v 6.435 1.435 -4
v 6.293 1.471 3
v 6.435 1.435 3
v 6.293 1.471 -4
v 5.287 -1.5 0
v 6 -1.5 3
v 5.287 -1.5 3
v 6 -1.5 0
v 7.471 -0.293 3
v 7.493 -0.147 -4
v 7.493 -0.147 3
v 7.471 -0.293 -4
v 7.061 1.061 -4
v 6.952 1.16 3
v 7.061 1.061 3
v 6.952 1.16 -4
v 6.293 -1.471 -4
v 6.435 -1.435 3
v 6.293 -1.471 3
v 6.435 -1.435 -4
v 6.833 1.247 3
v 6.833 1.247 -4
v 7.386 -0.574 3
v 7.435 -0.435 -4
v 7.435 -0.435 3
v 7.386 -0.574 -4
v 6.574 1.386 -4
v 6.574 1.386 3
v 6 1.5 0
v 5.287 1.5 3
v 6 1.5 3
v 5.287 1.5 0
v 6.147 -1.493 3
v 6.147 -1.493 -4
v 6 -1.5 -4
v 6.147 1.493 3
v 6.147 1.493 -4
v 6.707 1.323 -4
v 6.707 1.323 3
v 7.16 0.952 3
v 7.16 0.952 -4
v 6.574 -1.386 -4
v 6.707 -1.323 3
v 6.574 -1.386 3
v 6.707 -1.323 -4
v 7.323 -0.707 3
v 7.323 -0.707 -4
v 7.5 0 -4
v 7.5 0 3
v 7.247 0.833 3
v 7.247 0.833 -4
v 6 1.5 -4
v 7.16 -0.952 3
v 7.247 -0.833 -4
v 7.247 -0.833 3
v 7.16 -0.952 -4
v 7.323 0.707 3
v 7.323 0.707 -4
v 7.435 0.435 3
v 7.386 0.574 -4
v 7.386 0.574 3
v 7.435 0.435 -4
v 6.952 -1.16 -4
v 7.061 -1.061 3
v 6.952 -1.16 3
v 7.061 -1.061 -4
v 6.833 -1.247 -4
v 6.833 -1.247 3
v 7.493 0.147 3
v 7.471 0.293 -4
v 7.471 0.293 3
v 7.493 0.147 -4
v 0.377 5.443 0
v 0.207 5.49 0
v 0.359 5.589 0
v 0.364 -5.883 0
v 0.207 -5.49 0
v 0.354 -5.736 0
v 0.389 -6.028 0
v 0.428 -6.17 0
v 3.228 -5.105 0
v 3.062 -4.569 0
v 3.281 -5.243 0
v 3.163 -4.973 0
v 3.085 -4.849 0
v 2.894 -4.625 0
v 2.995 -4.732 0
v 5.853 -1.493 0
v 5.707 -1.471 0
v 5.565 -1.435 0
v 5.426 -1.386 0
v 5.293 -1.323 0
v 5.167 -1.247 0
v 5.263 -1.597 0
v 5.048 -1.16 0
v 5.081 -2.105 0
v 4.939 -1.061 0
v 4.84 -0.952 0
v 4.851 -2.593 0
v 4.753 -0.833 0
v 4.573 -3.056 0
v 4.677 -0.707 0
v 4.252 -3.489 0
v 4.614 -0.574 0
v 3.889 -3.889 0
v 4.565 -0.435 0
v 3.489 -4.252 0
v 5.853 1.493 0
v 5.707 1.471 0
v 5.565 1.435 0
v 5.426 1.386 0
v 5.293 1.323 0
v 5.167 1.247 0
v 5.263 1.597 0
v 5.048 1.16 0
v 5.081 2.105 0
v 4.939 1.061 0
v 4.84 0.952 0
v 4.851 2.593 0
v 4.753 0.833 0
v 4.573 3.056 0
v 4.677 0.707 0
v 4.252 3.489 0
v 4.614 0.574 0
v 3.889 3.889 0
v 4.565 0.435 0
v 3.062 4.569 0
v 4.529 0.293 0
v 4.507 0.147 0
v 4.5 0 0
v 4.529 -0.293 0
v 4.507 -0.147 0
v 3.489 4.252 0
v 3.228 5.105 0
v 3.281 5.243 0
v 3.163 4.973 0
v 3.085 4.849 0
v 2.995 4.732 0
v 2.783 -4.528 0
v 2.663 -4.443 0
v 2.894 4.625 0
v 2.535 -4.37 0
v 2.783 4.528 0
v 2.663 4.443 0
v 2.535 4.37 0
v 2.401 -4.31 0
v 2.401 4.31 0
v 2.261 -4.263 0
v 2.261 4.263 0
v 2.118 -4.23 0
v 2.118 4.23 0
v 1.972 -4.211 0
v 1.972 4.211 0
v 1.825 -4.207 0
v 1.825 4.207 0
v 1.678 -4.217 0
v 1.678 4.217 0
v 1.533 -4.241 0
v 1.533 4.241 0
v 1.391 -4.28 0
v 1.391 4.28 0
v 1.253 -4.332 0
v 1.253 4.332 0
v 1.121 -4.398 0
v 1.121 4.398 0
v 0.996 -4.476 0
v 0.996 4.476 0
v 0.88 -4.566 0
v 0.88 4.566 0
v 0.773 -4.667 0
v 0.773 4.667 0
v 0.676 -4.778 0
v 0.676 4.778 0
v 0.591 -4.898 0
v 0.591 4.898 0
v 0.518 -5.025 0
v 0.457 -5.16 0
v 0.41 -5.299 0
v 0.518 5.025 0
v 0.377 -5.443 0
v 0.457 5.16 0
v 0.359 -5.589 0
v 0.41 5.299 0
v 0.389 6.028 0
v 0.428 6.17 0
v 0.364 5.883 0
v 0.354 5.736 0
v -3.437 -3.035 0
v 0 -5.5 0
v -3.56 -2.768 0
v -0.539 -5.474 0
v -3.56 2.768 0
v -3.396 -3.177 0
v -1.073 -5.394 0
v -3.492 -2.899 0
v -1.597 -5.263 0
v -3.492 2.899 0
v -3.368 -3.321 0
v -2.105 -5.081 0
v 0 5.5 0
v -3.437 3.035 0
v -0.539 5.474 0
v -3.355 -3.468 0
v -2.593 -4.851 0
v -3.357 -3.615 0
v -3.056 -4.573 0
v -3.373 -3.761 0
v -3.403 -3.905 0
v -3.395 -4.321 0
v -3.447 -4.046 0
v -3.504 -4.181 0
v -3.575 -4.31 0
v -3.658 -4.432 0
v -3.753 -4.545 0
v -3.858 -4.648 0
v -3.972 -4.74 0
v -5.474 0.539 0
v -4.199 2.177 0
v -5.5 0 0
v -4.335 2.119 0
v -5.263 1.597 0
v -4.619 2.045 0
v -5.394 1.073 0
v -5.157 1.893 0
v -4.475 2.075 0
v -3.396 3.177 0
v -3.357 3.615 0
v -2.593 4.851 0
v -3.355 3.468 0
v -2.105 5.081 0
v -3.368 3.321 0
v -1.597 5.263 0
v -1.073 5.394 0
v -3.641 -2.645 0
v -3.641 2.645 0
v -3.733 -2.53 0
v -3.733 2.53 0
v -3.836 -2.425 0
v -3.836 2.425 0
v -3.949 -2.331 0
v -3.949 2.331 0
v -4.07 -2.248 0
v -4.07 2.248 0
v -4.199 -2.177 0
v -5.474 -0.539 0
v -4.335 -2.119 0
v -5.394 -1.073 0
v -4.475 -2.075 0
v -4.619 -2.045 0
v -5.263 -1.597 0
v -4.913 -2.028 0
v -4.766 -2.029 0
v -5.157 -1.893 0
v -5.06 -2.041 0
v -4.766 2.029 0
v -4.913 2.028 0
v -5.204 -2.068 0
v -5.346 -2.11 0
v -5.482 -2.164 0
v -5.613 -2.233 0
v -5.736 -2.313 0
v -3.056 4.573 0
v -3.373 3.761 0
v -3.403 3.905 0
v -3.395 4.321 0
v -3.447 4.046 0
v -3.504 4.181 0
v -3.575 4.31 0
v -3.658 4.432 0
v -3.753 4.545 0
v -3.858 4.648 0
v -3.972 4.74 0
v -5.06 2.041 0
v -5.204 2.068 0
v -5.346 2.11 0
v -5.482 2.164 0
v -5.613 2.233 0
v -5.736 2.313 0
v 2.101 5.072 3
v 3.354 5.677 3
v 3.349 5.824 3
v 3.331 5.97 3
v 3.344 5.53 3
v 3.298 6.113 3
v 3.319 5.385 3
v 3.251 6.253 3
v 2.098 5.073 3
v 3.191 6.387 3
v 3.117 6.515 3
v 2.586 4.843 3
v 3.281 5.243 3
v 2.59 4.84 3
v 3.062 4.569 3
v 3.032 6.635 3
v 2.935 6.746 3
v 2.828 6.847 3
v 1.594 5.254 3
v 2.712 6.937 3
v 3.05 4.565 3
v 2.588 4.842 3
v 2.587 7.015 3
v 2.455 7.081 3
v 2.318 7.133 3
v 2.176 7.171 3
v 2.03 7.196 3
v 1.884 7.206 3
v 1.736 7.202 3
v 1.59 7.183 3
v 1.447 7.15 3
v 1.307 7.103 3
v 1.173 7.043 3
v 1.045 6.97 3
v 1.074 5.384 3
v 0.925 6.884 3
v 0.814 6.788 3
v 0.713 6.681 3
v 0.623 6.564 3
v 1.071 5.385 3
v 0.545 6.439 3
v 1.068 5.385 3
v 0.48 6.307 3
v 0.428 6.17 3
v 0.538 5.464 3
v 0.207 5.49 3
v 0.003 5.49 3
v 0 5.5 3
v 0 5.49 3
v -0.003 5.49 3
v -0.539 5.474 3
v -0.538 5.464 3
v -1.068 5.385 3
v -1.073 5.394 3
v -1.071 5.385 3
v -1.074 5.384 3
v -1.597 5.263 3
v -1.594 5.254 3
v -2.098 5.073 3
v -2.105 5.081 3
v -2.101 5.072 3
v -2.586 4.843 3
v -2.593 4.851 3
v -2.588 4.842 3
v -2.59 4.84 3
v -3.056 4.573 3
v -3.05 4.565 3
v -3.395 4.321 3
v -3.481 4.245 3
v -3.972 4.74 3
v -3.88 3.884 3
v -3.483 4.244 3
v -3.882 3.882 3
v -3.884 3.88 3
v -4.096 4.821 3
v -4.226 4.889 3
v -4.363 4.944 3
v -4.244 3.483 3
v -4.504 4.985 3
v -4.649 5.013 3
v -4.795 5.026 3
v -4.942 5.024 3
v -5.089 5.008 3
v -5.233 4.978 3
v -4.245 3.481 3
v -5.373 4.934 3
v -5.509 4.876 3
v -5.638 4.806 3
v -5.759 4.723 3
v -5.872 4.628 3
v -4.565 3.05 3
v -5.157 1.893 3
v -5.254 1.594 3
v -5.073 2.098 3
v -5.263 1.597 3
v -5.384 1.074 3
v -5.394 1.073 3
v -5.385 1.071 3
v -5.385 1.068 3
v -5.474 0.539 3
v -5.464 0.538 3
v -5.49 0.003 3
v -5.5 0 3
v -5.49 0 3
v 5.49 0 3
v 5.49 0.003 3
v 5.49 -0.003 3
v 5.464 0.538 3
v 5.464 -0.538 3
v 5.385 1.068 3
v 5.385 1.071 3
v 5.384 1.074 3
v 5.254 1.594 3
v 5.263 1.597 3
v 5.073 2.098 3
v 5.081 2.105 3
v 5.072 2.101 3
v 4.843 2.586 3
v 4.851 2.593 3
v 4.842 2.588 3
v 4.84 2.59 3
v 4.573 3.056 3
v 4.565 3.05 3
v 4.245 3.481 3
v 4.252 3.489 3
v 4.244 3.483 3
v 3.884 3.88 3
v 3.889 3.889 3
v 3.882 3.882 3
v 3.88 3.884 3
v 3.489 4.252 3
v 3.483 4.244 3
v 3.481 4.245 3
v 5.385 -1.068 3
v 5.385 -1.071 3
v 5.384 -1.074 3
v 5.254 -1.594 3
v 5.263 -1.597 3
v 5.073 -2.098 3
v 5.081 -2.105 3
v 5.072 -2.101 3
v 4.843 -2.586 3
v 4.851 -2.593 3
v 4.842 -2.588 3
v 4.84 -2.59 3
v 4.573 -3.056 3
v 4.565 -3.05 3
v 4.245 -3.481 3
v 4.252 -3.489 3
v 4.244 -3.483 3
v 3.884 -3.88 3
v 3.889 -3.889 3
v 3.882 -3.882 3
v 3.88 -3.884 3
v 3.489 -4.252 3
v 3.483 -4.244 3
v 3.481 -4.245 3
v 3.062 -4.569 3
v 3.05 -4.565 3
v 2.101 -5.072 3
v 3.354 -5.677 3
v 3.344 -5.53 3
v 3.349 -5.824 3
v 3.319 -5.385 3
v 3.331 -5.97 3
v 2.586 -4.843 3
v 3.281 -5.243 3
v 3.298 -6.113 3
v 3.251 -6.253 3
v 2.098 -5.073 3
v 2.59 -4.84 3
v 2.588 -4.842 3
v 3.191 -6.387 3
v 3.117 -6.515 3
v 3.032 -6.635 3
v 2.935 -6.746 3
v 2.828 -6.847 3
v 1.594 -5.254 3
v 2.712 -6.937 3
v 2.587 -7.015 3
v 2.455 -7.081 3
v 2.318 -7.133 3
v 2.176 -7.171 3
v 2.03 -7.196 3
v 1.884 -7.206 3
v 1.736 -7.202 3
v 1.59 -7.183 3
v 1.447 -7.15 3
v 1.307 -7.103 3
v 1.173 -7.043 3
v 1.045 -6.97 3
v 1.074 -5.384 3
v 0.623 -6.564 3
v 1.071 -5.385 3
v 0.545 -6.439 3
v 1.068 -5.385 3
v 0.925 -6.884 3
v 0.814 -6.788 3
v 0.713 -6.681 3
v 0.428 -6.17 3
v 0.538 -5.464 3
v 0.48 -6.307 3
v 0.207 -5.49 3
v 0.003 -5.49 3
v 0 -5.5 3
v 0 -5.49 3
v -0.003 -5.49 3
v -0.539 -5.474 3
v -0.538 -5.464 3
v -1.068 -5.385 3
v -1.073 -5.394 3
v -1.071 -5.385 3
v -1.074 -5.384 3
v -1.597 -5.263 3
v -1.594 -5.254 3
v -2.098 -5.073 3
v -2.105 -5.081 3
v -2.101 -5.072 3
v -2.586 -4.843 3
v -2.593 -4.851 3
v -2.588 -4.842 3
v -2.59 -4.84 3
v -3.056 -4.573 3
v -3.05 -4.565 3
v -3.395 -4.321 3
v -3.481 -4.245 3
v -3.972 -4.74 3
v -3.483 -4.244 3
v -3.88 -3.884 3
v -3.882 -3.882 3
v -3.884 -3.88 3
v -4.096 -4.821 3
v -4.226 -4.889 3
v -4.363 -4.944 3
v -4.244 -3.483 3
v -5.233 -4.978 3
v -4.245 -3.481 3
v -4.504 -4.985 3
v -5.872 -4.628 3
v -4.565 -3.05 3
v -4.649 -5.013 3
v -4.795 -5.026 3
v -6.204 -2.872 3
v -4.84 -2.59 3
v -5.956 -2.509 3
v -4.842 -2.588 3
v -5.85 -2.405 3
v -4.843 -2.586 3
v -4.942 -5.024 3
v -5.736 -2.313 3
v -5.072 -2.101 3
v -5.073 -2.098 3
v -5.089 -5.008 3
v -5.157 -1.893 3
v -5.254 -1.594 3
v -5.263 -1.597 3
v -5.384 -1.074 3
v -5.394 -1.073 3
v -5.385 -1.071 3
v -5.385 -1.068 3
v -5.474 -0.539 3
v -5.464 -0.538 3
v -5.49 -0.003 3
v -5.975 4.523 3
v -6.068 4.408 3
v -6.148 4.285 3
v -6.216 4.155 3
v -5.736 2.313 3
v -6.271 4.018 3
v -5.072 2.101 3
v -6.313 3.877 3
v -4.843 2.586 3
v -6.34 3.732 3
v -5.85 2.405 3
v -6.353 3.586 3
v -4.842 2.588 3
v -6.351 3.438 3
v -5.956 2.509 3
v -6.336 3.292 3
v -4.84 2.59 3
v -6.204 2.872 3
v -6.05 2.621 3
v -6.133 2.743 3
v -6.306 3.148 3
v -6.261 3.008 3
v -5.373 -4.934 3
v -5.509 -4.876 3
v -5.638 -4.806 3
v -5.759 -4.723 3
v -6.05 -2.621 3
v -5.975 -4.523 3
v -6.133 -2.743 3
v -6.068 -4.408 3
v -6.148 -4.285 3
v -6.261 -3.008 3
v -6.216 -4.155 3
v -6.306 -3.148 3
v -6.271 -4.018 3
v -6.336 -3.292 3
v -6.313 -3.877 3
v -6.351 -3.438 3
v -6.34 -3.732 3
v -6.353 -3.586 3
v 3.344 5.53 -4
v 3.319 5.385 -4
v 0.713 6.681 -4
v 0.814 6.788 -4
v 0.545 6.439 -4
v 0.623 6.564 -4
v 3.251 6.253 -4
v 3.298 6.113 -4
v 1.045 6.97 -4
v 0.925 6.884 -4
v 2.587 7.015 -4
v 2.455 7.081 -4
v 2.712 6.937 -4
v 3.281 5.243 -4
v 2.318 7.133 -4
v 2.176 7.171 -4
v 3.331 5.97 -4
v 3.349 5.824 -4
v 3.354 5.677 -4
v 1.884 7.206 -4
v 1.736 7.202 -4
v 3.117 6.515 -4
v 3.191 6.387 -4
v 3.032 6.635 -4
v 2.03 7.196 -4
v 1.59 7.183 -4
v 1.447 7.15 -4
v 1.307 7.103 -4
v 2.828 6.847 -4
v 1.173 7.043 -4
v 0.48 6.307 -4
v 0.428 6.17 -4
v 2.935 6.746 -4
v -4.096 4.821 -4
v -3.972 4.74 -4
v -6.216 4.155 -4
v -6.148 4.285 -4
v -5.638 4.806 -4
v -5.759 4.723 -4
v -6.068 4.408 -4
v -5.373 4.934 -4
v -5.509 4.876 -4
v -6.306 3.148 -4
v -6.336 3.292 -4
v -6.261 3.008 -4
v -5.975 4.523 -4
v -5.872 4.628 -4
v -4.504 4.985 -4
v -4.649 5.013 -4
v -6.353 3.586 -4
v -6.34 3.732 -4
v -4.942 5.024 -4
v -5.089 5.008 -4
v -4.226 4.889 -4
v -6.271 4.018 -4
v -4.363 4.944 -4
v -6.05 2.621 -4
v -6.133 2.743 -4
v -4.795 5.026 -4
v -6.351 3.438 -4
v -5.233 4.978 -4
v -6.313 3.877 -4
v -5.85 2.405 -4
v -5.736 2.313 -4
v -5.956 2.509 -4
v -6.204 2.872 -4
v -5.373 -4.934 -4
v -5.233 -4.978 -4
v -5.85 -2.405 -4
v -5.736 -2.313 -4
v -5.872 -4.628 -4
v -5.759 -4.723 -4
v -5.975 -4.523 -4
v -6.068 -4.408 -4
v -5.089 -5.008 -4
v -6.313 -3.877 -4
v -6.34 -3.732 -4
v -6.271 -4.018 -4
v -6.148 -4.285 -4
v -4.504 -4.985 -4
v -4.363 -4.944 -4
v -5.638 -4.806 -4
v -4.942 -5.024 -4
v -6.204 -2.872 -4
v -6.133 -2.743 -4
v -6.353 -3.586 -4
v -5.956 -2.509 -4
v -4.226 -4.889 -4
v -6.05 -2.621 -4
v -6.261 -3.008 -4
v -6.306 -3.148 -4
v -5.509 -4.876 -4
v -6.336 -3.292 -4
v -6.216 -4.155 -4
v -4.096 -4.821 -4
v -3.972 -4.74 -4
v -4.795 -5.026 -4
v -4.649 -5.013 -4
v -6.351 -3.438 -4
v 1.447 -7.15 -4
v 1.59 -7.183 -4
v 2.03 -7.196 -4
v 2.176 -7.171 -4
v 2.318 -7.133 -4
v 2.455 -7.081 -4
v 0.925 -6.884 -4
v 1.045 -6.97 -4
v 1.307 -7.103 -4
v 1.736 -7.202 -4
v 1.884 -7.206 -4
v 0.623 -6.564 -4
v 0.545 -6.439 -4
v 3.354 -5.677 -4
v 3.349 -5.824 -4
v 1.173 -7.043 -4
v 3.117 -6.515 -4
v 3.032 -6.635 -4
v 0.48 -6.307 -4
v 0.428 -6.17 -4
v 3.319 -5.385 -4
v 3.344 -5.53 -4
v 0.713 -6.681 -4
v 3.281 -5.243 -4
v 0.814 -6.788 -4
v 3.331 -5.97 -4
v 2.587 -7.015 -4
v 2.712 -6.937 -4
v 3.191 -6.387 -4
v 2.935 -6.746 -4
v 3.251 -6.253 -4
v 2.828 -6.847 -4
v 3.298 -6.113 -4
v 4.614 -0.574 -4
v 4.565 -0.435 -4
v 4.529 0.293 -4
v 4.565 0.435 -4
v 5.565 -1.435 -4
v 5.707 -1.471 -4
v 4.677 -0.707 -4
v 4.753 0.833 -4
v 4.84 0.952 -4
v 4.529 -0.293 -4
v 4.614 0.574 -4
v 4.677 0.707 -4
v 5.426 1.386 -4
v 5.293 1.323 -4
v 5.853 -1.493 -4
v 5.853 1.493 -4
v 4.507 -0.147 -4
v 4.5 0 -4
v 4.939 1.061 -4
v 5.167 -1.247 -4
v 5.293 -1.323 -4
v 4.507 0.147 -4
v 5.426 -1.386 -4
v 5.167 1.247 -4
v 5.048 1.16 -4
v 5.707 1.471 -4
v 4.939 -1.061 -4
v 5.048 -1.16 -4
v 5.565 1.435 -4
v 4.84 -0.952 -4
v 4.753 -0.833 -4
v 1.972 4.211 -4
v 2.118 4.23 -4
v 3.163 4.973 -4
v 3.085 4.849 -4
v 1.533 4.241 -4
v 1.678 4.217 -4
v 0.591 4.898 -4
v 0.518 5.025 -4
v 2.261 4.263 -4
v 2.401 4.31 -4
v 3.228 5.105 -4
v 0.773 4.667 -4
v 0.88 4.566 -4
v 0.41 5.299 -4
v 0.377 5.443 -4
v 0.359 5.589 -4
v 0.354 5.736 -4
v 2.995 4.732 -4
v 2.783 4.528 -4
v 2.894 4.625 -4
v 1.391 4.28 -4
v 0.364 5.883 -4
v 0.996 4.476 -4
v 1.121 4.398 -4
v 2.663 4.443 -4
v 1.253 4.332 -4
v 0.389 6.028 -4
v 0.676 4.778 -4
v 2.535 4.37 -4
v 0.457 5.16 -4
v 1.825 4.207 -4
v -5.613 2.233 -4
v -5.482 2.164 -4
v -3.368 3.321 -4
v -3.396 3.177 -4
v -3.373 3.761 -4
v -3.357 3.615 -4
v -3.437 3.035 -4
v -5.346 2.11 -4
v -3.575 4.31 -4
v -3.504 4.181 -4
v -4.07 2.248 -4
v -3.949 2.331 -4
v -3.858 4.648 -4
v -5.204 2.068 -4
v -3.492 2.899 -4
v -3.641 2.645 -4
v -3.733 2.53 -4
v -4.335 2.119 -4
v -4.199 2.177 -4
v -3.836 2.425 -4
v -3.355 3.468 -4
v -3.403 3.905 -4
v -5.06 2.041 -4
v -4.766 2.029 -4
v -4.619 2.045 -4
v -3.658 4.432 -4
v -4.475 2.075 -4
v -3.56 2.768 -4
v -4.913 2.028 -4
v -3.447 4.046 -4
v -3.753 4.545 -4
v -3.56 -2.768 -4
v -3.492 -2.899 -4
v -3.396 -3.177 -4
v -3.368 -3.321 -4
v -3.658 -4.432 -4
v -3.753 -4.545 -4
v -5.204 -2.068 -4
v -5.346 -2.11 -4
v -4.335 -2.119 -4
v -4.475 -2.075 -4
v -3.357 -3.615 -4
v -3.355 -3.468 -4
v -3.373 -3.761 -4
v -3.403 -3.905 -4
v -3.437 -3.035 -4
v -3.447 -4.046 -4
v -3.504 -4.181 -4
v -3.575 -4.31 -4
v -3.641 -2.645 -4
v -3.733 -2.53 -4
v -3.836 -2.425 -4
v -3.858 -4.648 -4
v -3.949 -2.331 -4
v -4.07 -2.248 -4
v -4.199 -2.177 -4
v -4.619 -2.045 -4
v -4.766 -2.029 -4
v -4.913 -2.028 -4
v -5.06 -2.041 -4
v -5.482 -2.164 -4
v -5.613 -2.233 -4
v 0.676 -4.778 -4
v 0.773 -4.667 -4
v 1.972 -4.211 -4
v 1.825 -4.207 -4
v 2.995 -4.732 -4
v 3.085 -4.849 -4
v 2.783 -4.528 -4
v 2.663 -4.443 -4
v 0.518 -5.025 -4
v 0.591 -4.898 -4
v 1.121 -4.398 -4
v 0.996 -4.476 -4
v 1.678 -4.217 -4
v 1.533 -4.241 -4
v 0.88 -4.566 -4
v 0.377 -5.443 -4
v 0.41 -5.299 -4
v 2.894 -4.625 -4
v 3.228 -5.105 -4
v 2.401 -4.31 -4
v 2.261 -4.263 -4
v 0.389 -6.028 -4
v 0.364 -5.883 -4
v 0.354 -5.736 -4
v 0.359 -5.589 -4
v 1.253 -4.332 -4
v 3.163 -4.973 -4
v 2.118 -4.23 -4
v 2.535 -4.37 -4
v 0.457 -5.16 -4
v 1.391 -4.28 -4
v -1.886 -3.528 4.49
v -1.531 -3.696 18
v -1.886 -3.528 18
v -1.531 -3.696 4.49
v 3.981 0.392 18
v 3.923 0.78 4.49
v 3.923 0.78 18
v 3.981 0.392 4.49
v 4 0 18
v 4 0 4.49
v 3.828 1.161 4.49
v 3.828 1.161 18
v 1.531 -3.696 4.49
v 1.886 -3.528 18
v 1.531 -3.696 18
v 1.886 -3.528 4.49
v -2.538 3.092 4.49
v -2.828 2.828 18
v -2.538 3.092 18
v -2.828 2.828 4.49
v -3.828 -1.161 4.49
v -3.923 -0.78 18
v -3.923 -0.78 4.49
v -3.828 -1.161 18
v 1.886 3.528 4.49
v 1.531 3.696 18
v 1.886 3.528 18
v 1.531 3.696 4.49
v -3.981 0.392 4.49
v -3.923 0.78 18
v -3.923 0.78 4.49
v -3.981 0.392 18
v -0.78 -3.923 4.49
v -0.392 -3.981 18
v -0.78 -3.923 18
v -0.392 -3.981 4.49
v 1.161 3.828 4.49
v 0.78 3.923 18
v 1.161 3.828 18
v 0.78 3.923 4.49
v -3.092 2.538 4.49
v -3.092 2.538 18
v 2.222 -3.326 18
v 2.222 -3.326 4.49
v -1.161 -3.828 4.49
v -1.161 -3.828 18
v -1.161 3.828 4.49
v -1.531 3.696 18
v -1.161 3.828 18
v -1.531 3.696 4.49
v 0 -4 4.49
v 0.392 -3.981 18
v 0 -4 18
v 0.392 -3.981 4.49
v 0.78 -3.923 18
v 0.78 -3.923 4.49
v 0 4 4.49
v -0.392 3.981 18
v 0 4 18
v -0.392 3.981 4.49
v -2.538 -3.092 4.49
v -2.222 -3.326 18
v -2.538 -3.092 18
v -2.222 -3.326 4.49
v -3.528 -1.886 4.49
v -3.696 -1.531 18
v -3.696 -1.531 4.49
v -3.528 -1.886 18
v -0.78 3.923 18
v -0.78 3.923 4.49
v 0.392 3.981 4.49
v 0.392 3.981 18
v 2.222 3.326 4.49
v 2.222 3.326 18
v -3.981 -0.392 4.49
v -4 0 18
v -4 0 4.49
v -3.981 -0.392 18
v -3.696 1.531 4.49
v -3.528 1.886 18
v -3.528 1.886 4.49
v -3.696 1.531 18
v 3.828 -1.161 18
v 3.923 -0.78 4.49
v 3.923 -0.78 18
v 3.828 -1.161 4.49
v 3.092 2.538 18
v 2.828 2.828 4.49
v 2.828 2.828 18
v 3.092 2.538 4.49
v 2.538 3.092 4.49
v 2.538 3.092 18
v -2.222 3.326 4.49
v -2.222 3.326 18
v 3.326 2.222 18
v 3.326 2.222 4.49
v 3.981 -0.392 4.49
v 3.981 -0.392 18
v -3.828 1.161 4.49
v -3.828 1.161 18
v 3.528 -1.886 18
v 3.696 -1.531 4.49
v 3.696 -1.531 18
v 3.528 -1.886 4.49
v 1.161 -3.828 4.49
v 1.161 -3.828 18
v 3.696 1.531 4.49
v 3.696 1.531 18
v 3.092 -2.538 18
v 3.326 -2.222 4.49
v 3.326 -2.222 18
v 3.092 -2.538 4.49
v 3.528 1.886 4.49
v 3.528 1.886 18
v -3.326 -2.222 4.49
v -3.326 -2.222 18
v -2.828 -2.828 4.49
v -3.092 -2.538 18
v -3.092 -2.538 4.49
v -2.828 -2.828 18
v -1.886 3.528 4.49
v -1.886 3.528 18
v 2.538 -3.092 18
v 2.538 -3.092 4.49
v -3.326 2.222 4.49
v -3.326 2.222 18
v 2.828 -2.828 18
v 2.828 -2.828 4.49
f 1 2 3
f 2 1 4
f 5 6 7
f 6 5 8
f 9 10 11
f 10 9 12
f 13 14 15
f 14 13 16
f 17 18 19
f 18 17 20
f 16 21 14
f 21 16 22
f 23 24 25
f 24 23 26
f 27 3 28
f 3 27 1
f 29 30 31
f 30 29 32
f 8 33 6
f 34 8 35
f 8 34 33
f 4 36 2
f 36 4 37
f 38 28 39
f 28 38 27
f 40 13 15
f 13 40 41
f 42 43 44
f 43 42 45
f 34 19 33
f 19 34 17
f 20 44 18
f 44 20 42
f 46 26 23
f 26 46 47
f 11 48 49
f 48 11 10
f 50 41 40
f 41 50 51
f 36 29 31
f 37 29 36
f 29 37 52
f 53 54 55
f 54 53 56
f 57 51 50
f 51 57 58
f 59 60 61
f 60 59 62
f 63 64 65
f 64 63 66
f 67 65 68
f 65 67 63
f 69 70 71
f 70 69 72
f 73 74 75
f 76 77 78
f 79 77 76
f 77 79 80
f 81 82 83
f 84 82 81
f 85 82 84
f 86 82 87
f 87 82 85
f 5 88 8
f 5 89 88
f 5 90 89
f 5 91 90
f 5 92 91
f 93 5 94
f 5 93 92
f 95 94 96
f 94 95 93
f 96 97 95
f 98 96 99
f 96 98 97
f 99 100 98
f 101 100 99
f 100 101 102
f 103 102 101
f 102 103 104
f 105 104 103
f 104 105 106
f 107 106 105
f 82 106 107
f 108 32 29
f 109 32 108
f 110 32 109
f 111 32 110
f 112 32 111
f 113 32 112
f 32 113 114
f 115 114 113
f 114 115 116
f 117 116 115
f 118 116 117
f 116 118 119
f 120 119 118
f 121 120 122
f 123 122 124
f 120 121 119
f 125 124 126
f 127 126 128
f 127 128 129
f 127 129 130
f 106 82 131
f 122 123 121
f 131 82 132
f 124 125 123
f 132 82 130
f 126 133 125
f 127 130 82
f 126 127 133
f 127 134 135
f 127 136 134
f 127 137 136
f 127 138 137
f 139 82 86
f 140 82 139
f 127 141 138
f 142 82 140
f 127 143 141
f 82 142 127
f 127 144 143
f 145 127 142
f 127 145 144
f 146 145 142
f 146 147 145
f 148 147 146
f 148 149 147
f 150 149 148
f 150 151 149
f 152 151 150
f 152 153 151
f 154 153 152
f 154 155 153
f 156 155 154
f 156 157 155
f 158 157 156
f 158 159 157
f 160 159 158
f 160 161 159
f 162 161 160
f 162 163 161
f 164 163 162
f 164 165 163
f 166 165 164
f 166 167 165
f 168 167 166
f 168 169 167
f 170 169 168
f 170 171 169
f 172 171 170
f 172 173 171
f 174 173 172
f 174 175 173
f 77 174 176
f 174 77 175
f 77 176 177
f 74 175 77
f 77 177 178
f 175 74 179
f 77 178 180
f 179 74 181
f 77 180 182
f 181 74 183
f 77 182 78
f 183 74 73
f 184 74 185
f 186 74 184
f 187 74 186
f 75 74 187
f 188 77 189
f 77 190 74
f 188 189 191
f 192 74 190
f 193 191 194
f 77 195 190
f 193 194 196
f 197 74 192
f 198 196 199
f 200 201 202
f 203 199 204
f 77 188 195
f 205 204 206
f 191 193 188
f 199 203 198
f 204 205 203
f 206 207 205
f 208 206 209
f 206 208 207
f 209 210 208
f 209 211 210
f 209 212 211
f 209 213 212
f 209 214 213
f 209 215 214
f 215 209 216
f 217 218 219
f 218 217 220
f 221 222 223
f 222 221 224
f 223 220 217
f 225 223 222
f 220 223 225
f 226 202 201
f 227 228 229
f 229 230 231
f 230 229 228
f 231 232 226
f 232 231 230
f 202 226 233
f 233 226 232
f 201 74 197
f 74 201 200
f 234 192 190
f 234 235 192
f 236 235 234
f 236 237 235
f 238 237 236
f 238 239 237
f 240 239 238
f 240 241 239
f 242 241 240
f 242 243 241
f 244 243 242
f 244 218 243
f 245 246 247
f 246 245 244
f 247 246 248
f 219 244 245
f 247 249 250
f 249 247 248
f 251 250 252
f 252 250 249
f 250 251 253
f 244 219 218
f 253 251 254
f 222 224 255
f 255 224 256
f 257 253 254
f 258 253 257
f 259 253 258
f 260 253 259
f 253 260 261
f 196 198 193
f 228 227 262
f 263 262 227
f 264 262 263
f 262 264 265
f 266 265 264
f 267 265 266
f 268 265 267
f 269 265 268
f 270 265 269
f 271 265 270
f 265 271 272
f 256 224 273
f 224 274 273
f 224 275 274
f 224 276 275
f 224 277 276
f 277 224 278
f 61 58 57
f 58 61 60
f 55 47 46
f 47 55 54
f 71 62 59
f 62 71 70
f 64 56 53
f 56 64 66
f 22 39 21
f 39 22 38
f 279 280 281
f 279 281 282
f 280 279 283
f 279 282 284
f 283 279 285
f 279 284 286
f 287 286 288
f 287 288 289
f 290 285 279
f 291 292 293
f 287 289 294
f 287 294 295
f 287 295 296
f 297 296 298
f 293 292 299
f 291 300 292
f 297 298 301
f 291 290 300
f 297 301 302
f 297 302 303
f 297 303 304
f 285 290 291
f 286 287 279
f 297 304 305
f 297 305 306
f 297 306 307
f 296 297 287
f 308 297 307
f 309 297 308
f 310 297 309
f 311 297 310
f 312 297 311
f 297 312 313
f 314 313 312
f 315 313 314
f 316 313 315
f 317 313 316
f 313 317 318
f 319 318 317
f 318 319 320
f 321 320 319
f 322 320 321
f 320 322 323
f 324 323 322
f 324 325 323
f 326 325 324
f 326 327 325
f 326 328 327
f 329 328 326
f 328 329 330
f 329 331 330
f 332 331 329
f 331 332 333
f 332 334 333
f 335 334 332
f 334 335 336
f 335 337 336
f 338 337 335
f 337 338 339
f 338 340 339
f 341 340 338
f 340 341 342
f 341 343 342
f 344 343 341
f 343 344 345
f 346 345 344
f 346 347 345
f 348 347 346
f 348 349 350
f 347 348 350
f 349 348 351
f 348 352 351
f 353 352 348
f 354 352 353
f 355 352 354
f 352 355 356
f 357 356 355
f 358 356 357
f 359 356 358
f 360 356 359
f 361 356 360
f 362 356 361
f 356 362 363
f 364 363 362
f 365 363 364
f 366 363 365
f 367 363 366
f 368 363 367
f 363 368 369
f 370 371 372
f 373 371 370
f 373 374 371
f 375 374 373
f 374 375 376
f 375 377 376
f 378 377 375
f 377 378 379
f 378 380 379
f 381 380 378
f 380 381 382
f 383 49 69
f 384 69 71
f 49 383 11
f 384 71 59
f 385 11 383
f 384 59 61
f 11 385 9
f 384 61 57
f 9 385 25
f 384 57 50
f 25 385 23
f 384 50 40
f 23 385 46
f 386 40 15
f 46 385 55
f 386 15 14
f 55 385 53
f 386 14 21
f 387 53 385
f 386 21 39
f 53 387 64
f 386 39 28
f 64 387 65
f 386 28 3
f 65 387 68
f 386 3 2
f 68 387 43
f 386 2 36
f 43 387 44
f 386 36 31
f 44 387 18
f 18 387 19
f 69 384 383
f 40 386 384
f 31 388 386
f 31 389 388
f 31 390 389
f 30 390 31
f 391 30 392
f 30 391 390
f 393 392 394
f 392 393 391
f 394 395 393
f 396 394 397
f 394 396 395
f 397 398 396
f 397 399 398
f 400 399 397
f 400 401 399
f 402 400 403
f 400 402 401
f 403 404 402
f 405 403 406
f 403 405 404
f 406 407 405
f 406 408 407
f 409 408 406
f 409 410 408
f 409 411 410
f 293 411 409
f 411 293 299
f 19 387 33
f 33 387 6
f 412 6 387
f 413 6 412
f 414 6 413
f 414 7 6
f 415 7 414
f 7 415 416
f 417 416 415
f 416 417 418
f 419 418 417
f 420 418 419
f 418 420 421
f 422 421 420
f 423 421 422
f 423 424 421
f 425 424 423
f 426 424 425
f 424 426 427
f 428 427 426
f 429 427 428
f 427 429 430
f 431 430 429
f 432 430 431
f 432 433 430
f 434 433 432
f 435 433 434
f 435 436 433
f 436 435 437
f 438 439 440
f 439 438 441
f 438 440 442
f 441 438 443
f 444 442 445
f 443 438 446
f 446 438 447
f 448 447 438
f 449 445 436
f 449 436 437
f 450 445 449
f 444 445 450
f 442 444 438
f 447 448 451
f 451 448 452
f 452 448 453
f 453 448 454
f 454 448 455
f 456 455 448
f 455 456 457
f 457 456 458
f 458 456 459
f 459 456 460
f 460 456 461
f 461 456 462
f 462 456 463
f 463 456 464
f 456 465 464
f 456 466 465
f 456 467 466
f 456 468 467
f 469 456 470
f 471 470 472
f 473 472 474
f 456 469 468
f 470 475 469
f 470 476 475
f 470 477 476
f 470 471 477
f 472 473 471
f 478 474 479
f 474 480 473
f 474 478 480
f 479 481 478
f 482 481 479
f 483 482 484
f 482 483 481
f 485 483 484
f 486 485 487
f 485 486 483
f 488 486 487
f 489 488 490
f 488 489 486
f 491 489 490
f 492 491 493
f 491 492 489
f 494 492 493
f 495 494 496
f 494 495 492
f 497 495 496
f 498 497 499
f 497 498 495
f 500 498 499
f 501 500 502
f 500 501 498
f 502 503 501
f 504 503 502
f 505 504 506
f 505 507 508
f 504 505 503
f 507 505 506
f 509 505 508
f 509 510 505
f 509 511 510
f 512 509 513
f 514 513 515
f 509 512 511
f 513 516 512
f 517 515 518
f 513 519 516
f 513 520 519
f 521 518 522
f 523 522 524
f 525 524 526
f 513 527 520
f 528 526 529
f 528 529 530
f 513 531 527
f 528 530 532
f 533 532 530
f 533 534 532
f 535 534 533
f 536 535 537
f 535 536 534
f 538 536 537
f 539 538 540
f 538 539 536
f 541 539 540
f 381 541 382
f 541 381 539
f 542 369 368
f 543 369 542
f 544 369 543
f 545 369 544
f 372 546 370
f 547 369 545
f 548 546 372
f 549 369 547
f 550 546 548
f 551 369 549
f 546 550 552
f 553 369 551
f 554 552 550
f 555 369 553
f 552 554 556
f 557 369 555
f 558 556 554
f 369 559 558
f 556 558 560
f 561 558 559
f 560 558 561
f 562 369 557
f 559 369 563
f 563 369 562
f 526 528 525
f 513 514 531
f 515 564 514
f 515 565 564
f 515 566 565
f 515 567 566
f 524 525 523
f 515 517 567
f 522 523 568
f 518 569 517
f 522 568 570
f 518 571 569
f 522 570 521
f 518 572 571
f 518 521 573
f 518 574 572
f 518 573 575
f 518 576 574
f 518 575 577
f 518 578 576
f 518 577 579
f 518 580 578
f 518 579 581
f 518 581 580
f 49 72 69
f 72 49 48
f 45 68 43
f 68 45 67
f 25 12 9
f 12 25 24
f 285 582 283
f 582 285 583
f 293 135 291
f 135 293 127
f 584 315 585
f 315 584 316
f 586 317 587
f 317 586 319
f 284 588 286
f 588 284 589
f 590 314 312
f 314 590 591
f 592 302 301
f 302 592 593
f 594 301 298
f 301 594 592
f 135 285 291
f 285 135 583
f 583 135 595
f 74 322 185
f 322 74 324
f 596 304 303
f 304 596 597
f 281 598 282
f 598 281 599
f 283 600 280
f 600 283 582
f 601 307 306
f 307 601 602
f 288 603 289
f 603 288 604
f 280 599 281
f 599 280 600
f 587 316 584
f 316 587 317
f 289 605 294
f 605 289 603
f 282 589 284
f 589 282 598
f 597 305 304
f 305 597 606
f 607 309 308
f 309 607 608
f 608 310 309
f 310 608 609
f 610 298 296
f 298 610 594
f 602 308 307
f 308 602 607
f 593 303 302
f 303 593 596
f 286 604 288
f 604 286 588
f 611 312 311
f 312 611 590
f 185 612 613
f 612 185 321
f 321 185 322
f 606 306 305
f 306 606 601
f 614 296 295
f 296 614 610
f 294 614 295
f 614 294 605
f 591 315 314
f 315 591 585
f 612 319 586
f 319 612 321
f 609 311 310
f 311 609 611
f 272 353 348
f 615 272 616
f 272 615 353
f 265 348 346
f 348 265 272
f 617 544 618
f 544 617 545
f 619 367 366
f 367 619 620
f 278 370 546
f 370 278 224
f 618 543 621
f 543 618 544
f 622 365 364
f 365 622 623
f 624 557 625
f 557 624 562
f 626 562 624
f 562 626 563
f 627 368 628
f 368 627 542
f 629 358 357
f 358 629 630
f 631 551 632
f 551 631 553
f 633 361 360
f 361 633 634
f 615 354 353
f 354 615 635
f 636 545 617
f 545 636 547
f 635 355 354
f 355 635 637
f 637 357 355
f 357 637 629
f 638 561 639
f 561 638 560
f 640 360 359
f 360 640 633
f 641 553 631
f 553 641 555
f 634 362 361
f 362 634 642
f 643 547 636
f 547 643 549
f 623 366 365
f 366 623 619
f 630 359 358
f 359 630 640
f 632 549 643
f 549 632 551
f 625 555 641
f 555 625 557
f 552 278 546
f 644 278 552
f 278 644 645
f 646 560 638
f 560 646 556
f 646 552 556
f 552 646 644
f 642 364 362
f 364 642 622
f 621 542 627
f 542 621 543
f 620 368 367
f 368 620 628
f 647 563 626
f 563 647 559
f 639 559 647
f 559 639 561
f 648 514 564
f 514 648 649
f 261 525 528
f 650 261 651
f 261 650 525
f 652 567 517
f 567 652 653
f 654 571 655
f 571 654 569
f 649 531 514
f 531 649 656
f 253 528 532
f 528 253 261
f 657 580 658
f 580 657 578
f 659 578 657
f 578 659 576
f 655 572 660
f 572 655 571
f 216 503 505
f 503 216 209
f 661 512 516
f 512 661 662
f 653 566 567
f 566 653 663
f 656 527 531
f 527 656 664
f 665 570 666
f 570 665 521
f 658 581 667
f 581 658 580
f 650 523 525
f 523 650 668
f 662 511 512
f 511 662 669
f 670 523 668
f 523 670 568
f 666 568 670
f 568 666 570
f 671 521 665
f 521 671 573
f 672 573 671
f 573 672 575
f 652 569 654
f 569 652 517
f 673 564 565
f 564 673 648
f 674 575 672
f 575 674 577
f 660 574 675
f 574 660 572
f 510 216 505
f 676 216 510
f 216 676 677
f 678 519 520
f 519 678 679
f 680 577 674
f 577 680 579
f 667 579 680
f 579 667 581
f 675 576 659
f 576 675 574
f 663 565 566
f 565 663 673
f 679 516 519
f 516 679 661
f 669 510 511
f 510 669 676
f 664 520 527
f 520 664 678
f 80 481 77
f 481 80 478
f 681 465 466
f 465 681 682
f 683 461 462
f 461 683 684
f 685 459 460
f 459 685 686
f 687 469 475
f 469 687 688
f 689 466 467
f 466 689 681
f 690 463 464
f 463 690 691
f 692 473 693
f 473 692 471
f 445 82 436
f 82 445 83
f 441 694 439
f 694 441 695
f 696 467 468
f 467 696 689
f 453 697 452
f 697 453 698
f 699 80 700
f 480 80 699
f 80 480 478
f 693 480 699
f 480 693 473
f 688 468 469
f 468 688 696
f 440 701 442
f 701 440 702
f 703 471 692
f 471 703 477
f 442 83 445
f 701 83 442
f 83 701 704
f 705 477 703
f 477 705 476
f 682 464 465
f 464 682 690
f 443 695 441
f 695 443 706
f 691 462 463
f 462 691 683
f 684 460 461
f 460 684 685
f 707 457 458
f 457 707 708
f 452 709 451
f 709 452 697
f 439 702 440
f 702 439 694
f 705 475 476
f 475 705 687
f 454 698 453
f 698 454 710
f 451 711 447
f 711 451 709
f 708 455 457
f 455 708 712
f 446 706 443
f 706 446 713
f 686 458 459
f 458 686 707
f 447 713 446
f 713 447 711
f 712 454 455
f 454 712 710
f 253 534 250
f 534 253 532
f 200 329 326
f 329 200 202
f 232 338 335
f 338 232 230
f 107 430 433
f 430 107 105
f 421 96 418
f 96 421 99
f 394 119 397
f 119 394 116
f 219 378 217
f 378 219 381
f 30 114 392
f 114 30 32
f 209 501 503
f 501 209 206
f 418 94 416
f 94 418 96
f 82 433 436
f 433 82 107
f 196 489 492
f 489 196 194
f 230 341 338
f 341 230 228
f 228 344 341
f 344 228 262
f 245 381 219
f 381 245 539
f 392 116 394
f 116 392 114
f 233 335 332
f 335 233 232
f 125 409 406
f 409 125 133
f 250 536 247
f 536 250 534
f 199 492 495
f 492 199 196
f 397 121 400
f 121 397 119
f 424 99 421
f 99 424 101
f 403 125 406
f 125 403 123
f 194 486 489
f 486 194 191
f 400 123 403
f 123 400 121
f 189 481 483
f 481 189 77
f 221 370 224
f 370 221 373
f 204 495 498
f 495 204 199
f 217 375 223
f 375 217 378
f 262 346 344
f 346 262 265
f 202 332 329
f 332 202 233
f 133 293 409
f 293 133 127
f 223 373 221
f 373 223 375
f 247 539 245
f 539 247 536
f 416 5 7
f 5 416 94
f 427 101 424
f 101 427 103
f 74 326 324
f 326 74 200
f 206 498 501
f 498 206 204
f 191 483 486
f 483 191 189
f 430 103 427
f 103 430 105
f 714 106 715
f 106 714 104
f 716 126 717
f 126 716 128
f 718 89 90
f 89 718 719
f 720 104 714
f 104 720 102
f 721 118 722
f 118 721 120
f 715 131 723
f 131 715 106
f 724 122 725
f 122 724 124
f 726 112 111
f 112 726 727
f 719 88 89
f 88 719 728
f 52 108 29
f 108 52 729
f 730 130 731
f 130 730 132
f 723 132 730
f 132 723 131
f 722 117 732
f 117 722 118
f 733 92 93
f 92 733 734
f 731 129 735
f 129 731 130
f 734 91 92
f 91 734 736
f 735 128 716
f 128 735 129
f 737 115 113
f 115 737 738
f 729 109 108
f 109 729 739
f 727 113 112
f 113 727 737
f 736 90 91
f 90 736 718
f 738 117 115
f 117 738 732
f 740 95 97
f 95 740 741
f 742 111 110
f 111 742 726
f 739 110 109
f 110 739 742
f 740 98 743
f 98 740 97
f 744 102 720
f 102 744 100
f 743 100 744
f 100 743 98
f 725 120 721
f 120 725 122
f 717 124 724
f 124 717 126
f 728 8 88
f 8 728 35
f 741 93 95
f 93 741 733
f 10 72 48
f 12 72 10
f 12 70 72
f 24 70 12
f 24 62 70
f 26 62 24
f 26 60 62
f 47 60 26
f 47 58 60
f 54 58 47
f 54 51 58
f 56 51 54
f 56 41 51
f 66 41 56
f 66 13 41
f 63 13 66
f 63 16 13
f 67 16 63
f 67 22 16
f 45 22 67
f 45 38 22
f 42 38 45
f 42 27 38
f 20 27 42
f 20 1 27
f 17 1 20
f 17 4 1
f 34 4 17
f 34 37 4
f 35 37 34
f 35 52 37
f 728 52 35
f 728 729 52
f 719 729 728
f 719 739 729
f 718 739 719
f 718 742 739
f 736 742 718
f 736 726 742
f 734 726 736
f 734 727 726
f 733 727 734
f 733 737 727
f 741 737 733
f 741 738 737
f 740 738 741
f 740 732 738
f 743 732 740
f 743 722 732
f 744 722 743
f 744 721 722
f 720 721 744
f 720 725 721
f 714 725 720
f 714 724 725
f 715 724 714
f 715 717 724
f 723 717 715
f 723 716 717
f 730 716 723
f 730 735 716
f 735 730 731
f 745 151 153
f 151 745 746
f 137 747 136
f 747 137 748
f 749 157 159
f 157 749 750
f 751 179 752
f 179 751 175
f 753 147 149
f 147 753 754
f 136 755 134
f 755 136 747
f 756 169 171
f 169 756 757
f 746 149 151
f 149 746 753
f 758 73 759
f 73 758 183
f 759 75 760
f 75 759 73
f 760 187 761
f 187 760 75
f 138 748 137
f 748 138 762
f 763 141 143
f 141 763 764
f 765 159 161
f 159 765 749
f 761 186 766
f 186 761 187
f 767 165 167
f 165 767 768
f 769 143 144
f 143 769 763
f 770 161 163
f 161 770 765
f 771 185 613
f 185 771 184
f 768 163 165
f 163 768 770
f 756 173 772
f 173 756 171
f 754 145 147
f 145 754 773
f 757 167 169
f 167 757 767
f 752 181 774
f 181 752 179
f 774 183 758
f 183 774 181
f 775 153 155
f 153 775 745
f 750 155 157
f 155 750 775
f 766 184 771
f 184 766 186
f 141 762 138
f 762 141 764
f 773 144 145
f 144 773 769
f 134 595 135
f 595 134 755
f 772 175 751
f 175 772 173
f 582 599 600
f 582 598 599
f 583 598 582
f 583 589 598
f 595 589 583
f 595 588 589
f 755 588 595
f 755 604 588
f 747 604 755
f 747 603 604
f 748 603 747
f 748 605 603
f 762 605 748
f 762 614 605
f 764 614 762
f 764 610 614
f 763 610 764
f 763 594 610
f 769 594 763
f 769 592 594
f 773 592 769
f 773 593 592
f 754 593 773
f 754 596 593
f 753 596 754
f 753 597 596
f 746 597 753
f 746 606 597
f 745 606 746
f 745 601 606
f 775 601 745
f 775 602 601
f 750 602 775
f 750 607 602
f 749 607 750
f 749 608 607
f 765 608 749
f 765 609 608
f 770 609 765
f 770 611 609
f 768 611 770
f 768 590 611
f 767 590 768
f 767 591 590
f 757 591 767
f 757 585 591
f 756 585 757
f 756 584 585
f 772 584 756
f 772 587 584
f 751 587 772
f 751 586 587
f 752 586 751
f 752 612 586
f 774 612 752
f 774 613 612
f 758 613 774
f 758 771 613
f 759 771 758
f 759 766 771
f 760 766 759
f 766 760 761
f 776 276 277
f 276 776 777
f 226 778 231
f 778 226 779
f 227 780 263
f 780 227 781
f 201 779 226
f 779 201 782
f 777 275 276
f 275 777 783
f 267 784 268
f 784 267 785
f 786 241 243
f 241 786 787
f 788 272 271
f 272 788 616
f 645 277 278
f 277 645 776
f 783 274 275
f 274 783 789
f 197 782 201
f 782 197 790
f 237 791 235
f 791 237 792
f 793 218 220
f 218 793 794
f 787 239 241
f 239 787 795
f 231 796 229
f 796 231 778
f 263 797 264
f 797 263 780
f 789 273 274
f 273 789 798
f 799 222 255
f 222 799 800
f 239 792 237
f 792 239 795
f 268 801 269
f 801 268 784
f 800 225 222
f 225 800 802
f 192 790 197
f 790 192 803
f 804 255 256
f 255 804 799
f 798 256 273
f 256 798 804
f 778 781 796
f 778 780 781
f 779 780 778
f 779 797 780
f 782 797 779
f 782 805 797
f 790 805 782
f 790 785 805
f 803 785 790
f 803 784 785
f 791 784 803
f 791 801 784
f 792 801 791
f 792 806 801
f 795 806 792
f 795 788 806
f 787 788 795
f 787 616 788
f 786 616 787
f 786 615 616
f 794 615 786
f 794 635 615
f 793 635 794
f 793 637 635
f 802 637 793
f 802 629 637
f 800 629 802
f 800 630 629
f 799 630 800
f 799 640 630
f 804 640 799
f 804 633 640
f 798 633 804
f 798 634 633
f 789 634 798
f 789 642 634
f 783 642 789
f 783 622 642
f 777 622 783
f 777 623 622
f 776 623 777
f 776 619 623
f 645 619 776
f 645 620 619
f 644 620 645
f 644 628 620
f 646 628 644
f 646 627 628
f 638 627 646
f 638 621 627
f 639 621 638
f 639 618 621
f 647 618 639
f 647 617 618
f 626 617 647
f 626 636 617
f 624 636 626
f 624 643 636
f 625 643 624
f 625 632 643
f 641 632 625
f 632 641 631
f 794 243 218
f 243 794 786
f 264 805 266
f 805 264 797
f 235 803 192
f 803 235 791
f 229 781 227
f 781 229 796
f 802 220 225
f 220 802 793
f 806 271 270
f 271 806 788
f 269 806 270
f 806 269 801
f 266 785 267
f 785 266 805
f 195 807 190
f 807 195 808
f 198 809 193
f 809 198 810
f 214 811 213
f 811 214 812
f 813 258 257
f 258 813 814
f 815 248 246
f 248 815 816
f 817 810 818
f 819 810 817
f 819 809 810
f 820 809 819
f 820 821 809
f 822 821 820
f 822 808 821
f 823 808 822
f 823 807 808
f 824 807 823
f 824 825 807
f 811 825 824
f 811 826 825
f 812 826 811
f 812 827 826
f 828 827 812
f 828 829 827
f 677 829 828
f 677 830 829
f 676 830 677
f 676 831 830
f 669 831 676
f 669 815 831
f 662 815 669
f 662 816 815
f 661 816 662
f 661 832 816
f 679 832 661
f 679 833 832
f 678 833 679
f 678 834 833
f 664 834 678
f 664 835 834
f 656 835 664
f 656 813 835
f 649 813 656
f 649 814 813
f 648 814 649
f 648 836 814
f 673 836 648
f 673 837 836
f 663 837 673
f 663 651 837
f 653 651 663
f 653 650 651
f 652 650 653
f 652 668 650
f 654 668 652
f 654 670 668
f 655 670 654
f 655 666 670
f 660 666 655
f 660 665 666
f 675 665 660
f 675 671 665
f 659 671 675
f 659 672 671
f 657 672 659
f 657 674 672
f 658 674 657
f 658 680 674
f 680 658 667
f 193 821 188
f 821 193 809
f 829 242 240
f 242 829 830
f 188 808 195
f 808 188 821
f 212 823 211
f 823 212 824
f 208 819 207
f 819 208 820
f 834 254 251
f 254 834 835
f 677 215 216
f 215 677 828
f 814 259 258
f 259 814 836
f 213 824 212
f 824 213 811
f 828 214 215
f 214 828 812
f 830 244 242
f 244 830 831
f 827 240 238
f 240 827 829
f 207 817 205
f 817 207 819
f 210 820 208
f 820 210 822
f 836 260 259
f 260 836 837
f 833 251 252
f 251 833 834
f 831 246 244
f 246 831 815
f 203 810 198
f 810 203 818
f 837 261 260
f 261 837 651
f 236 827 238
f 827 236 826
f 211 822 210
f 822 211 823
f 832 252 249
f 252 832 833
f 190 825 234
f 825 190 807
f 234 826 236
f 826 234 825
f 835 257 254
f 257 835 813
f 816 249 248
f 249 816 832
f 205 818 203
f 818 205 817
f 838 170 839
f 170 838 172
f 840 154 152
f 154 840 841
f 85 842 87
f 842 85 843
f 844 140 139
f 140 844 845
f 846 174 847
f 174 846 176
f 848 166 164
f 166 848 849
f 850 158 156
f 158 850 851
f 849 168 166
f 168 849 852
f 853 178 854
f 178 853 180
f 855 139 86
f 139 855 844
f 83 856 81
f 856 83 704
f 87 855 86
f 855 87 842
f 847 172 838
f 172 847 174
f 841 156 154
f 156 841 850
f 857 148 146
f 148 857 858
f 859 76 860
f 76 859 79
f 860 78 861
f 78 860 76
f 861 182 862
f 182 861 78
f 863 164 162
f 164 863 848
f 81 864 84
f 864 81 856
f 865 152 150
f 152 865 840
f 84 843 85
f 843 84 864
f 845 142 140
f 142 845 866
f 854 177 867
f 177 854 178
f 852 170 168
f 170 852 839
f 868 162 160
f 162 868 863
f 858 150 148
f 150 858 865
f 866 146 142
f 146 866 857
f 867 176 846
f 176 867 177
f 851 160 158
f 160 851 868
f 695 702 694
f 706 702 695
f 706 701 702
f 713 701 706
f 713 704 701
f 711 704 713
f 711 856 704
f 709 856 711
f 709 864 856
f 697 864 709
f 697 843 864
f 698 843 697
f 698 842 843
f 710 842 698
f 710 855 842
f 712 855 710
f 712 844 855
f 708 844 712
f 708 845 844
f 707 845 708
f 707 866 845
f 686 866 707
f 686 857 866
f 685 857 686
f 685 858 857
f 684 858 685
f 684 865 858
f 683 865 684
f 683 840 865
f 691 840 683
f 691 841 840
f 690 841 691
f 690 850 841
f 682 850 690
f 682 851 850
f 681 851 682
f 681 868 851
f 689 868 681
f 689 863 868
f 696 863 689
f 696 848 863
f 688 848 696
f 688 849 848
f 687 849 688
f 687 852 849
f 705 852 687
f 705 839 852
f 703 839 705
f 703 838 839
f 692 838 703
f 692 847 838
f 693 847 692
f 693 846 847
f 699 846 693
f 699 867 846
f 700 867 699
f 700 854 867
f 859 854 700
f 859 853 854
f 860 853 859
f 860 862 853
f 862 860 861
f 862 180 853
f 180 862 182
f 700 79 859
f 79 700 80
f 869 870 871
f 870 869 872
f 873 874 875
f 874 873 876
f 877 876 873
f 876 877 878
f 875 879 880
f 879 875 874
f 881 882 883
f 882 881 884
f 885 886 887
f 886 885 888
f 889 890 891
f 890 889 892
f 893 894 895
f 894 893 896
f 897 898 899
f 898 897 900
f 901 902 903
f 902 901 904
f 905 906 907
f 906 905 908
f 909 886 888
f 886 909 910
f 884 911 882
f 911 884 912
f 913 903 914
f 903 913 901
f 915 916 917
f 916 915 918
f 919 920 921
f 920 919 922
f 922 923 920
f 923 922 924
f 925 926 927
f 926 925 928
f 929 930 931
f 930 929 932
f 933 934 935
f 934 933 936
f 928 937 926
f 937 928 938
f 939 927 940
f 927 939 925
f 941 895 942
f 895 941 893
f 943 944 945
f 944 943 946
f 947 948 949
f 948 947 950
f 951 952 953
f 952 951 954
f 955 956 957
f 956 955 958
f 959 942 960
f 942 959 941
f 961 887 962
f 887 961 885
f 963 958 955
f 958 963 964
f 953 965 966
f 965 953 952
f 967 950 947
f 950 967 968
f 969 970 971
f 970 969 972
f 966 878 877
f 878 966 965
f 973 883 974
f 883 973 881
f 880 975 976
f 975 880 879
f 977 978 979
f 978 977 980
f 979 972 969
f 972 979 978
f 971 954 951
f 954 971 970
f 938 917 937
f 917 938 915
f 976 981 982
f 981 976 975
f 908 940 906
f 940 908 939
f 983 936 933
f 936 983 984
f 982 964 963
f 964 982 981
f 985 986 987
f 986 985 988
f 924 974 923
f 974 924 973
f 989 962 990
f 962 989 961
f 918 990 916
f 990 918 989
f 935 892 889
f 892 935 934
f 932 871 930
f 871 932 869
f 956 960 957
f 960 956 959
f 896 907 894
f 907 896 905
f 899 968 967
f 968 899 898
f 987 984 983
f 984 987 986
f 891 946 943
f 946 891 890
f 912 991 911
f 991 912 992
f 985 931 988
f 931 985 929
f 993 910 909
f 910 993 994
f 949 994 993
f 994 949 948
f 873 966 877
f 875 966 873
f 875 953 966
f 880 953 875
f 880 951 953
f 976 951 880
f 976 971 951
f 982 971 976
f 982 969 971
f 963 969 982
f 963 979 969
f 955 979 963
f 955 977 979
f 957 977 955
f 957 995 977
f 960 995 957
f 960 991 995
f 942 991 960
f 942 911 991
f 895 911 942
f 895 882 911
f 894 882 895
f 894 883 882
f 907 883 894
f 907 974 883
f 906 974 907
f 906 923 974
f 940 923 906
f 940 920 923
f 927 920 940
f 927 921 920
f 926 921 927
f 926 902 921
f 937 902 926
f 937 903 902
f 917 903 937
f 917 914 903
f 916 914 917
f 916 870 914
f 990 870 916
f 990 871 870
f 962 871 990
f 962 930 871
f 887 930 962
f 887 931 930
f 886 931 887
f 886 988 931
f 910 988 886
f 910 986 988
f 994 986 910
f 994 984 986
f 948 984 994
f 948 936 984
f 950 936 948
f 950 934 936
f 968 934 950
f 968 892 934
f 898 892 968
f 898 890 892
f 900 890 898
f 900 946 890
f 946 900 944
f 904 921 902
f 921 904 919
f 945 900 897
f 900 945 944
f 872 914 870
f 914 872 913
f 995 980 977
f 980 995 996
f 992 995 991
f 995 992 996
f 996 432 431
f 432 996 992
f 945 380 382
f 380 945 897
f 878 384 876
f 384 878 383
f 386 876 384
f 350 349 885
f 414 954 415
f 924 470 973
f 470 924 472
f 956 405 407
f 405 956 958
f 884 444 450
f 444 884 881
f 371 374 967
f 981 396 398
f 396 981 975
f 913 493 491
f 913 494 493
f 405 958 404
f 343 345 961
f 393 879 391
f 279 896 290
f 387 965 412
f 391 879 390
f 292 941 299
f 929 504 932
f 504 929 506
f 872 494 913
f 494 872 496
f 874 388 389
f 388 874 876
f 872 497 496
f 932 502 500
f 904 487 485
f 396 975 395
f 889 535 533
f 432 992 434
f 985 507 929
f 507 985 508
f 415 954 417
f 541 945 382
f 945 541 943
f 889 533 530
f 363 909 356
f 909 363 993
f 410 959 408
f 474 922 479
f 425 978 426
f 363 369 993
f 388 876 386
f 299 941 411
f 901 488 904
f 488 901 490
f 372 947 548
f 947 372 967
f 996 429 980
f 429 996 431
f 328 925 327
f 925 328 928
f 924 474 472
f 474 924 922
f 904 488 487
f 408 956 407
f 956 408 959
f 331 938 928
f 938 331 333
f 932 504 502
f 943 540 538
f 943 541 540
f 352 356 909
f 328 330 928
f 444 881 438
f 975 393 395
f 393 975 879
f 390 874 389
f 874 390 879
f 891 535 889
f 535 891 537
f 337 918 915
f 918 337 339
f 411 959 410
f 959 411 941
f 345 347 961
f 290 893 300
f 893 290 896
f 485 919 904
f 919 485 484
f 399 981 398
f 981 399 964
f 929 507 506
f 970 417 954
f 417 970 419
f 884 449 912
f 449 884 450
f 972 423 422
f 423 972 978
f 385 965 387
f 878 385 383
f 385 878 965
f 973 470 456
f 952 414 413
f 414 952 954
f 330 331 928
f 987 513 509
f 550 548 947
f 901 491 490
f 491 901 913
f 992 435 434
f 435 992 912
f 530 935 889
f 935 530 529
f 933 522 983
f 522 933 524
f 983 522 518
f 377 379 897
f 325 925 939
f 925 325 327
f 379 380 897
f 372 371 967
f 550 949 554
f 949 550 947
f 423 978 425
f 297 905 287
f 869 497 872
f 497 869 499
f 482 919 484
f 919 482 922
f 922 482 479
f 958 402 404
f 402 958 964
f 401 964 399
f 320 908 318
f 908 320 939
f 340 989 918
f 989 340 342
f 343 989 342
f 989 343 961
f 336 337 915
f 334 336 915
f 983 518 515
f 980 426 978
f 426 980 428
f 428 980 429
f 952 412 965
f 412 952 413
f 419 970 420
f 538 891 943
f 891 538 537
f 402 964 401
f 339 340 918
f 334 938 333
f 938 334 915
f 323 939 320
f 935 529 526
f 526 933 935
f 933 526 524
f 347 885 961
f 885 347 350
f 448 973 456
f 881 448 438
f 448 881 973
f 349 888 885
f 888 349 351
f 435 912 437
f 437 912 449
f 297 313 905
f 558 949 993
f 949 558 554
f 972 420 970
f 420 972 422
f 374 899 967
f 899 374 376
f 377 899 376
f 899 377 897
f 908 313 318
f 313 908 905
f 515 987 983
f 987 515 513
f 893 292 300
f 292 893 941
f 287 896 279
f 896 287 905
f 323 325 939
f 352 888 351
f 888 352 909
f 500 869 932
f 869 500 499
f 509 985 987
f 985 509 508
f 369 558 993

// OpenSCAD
// ============================================================
//  Toy Car Wheel Drill Adapter
//  Initial design by Claude, refined by a human.
//
//  5 pins slot into the gaps between a 5-spoke toy car wheel.
//  Pins are joined to a central hub by arms (wagon-wheel style),
//  and a single shaft off the hub goes into a drill chuck.
// ============================================================

/* [Pins] */
pin_count    = 5;
// Pin diameter
pin_dia      = 3.0;
// Pin length (below the arms)
pin_length   = 4.0;
// Pin center to hub center
pin_radius   = 6.0;

/* [Hub + Arms] */
// Central hub diameter
hub_dia      = 11;
// Arm width
arm_width    = 3.0;
// Thickness of the hub/arm layer
arm_thick    = 3.0;

/* [Shaft] */
// Shaft diameter (goes in the drill chuck)
shaft_dia    = 8.0;
// Shaft length (above the hub)
shaft_length = 15.0;
// Fillet cone where the shaft meets the hub
shaft_fillet = 1.5;

/* [Hidden] */
$fn = 64;

// ============================================================
//  MODULE: arms
//  Hub disc plus one arm out to each pin, rounded at the pin end
// ============================================================
module arms() {
    cylinder(d = hub_dia, h = arm_thick);
    for (i = [0 : pin_count - 1])
        rotate([0, 0, i * 360 / pin_count])
            hull() {
                cylinder(d = arm_width, h = arm_thick);
                translate([pin_radius, 0, 0])
                    cylinder(d = max(arm_width, pin_dia), h = arm_thick);
            }
}

// ============================================================
//  MODULE: pins
//  Hang down from the arms into the gaps between the spokes
// ============================================================
module pins() {
    for (i = [0 : pin_count - 1])
        rotate([0, 0, i * 360 / pin_count])
            translate([pin_radius, 0, -pin_length])
                cylinder(d = pin_dia, h = pin_length + 0.01);
}

// ============================================================
//  MODULE: shaft
//  Drill chuck shaft with a small fillet into the hub
// ============================================================
module shaft() {
    translate([0, 0, arm_thick - 0.01]) {
        cylinder(d = shaft_dia, h = shaft_length + 0.01);
        cylinder(d1 = shaft_dia + 2 * shaft_fillet, d2 = shaft_dia, h = shaft_fillet);
    }
}

// ============================================================
//  ASSEMBLY
// ============================================================
union() {
    arms();
    pins();
    shaft();
}
